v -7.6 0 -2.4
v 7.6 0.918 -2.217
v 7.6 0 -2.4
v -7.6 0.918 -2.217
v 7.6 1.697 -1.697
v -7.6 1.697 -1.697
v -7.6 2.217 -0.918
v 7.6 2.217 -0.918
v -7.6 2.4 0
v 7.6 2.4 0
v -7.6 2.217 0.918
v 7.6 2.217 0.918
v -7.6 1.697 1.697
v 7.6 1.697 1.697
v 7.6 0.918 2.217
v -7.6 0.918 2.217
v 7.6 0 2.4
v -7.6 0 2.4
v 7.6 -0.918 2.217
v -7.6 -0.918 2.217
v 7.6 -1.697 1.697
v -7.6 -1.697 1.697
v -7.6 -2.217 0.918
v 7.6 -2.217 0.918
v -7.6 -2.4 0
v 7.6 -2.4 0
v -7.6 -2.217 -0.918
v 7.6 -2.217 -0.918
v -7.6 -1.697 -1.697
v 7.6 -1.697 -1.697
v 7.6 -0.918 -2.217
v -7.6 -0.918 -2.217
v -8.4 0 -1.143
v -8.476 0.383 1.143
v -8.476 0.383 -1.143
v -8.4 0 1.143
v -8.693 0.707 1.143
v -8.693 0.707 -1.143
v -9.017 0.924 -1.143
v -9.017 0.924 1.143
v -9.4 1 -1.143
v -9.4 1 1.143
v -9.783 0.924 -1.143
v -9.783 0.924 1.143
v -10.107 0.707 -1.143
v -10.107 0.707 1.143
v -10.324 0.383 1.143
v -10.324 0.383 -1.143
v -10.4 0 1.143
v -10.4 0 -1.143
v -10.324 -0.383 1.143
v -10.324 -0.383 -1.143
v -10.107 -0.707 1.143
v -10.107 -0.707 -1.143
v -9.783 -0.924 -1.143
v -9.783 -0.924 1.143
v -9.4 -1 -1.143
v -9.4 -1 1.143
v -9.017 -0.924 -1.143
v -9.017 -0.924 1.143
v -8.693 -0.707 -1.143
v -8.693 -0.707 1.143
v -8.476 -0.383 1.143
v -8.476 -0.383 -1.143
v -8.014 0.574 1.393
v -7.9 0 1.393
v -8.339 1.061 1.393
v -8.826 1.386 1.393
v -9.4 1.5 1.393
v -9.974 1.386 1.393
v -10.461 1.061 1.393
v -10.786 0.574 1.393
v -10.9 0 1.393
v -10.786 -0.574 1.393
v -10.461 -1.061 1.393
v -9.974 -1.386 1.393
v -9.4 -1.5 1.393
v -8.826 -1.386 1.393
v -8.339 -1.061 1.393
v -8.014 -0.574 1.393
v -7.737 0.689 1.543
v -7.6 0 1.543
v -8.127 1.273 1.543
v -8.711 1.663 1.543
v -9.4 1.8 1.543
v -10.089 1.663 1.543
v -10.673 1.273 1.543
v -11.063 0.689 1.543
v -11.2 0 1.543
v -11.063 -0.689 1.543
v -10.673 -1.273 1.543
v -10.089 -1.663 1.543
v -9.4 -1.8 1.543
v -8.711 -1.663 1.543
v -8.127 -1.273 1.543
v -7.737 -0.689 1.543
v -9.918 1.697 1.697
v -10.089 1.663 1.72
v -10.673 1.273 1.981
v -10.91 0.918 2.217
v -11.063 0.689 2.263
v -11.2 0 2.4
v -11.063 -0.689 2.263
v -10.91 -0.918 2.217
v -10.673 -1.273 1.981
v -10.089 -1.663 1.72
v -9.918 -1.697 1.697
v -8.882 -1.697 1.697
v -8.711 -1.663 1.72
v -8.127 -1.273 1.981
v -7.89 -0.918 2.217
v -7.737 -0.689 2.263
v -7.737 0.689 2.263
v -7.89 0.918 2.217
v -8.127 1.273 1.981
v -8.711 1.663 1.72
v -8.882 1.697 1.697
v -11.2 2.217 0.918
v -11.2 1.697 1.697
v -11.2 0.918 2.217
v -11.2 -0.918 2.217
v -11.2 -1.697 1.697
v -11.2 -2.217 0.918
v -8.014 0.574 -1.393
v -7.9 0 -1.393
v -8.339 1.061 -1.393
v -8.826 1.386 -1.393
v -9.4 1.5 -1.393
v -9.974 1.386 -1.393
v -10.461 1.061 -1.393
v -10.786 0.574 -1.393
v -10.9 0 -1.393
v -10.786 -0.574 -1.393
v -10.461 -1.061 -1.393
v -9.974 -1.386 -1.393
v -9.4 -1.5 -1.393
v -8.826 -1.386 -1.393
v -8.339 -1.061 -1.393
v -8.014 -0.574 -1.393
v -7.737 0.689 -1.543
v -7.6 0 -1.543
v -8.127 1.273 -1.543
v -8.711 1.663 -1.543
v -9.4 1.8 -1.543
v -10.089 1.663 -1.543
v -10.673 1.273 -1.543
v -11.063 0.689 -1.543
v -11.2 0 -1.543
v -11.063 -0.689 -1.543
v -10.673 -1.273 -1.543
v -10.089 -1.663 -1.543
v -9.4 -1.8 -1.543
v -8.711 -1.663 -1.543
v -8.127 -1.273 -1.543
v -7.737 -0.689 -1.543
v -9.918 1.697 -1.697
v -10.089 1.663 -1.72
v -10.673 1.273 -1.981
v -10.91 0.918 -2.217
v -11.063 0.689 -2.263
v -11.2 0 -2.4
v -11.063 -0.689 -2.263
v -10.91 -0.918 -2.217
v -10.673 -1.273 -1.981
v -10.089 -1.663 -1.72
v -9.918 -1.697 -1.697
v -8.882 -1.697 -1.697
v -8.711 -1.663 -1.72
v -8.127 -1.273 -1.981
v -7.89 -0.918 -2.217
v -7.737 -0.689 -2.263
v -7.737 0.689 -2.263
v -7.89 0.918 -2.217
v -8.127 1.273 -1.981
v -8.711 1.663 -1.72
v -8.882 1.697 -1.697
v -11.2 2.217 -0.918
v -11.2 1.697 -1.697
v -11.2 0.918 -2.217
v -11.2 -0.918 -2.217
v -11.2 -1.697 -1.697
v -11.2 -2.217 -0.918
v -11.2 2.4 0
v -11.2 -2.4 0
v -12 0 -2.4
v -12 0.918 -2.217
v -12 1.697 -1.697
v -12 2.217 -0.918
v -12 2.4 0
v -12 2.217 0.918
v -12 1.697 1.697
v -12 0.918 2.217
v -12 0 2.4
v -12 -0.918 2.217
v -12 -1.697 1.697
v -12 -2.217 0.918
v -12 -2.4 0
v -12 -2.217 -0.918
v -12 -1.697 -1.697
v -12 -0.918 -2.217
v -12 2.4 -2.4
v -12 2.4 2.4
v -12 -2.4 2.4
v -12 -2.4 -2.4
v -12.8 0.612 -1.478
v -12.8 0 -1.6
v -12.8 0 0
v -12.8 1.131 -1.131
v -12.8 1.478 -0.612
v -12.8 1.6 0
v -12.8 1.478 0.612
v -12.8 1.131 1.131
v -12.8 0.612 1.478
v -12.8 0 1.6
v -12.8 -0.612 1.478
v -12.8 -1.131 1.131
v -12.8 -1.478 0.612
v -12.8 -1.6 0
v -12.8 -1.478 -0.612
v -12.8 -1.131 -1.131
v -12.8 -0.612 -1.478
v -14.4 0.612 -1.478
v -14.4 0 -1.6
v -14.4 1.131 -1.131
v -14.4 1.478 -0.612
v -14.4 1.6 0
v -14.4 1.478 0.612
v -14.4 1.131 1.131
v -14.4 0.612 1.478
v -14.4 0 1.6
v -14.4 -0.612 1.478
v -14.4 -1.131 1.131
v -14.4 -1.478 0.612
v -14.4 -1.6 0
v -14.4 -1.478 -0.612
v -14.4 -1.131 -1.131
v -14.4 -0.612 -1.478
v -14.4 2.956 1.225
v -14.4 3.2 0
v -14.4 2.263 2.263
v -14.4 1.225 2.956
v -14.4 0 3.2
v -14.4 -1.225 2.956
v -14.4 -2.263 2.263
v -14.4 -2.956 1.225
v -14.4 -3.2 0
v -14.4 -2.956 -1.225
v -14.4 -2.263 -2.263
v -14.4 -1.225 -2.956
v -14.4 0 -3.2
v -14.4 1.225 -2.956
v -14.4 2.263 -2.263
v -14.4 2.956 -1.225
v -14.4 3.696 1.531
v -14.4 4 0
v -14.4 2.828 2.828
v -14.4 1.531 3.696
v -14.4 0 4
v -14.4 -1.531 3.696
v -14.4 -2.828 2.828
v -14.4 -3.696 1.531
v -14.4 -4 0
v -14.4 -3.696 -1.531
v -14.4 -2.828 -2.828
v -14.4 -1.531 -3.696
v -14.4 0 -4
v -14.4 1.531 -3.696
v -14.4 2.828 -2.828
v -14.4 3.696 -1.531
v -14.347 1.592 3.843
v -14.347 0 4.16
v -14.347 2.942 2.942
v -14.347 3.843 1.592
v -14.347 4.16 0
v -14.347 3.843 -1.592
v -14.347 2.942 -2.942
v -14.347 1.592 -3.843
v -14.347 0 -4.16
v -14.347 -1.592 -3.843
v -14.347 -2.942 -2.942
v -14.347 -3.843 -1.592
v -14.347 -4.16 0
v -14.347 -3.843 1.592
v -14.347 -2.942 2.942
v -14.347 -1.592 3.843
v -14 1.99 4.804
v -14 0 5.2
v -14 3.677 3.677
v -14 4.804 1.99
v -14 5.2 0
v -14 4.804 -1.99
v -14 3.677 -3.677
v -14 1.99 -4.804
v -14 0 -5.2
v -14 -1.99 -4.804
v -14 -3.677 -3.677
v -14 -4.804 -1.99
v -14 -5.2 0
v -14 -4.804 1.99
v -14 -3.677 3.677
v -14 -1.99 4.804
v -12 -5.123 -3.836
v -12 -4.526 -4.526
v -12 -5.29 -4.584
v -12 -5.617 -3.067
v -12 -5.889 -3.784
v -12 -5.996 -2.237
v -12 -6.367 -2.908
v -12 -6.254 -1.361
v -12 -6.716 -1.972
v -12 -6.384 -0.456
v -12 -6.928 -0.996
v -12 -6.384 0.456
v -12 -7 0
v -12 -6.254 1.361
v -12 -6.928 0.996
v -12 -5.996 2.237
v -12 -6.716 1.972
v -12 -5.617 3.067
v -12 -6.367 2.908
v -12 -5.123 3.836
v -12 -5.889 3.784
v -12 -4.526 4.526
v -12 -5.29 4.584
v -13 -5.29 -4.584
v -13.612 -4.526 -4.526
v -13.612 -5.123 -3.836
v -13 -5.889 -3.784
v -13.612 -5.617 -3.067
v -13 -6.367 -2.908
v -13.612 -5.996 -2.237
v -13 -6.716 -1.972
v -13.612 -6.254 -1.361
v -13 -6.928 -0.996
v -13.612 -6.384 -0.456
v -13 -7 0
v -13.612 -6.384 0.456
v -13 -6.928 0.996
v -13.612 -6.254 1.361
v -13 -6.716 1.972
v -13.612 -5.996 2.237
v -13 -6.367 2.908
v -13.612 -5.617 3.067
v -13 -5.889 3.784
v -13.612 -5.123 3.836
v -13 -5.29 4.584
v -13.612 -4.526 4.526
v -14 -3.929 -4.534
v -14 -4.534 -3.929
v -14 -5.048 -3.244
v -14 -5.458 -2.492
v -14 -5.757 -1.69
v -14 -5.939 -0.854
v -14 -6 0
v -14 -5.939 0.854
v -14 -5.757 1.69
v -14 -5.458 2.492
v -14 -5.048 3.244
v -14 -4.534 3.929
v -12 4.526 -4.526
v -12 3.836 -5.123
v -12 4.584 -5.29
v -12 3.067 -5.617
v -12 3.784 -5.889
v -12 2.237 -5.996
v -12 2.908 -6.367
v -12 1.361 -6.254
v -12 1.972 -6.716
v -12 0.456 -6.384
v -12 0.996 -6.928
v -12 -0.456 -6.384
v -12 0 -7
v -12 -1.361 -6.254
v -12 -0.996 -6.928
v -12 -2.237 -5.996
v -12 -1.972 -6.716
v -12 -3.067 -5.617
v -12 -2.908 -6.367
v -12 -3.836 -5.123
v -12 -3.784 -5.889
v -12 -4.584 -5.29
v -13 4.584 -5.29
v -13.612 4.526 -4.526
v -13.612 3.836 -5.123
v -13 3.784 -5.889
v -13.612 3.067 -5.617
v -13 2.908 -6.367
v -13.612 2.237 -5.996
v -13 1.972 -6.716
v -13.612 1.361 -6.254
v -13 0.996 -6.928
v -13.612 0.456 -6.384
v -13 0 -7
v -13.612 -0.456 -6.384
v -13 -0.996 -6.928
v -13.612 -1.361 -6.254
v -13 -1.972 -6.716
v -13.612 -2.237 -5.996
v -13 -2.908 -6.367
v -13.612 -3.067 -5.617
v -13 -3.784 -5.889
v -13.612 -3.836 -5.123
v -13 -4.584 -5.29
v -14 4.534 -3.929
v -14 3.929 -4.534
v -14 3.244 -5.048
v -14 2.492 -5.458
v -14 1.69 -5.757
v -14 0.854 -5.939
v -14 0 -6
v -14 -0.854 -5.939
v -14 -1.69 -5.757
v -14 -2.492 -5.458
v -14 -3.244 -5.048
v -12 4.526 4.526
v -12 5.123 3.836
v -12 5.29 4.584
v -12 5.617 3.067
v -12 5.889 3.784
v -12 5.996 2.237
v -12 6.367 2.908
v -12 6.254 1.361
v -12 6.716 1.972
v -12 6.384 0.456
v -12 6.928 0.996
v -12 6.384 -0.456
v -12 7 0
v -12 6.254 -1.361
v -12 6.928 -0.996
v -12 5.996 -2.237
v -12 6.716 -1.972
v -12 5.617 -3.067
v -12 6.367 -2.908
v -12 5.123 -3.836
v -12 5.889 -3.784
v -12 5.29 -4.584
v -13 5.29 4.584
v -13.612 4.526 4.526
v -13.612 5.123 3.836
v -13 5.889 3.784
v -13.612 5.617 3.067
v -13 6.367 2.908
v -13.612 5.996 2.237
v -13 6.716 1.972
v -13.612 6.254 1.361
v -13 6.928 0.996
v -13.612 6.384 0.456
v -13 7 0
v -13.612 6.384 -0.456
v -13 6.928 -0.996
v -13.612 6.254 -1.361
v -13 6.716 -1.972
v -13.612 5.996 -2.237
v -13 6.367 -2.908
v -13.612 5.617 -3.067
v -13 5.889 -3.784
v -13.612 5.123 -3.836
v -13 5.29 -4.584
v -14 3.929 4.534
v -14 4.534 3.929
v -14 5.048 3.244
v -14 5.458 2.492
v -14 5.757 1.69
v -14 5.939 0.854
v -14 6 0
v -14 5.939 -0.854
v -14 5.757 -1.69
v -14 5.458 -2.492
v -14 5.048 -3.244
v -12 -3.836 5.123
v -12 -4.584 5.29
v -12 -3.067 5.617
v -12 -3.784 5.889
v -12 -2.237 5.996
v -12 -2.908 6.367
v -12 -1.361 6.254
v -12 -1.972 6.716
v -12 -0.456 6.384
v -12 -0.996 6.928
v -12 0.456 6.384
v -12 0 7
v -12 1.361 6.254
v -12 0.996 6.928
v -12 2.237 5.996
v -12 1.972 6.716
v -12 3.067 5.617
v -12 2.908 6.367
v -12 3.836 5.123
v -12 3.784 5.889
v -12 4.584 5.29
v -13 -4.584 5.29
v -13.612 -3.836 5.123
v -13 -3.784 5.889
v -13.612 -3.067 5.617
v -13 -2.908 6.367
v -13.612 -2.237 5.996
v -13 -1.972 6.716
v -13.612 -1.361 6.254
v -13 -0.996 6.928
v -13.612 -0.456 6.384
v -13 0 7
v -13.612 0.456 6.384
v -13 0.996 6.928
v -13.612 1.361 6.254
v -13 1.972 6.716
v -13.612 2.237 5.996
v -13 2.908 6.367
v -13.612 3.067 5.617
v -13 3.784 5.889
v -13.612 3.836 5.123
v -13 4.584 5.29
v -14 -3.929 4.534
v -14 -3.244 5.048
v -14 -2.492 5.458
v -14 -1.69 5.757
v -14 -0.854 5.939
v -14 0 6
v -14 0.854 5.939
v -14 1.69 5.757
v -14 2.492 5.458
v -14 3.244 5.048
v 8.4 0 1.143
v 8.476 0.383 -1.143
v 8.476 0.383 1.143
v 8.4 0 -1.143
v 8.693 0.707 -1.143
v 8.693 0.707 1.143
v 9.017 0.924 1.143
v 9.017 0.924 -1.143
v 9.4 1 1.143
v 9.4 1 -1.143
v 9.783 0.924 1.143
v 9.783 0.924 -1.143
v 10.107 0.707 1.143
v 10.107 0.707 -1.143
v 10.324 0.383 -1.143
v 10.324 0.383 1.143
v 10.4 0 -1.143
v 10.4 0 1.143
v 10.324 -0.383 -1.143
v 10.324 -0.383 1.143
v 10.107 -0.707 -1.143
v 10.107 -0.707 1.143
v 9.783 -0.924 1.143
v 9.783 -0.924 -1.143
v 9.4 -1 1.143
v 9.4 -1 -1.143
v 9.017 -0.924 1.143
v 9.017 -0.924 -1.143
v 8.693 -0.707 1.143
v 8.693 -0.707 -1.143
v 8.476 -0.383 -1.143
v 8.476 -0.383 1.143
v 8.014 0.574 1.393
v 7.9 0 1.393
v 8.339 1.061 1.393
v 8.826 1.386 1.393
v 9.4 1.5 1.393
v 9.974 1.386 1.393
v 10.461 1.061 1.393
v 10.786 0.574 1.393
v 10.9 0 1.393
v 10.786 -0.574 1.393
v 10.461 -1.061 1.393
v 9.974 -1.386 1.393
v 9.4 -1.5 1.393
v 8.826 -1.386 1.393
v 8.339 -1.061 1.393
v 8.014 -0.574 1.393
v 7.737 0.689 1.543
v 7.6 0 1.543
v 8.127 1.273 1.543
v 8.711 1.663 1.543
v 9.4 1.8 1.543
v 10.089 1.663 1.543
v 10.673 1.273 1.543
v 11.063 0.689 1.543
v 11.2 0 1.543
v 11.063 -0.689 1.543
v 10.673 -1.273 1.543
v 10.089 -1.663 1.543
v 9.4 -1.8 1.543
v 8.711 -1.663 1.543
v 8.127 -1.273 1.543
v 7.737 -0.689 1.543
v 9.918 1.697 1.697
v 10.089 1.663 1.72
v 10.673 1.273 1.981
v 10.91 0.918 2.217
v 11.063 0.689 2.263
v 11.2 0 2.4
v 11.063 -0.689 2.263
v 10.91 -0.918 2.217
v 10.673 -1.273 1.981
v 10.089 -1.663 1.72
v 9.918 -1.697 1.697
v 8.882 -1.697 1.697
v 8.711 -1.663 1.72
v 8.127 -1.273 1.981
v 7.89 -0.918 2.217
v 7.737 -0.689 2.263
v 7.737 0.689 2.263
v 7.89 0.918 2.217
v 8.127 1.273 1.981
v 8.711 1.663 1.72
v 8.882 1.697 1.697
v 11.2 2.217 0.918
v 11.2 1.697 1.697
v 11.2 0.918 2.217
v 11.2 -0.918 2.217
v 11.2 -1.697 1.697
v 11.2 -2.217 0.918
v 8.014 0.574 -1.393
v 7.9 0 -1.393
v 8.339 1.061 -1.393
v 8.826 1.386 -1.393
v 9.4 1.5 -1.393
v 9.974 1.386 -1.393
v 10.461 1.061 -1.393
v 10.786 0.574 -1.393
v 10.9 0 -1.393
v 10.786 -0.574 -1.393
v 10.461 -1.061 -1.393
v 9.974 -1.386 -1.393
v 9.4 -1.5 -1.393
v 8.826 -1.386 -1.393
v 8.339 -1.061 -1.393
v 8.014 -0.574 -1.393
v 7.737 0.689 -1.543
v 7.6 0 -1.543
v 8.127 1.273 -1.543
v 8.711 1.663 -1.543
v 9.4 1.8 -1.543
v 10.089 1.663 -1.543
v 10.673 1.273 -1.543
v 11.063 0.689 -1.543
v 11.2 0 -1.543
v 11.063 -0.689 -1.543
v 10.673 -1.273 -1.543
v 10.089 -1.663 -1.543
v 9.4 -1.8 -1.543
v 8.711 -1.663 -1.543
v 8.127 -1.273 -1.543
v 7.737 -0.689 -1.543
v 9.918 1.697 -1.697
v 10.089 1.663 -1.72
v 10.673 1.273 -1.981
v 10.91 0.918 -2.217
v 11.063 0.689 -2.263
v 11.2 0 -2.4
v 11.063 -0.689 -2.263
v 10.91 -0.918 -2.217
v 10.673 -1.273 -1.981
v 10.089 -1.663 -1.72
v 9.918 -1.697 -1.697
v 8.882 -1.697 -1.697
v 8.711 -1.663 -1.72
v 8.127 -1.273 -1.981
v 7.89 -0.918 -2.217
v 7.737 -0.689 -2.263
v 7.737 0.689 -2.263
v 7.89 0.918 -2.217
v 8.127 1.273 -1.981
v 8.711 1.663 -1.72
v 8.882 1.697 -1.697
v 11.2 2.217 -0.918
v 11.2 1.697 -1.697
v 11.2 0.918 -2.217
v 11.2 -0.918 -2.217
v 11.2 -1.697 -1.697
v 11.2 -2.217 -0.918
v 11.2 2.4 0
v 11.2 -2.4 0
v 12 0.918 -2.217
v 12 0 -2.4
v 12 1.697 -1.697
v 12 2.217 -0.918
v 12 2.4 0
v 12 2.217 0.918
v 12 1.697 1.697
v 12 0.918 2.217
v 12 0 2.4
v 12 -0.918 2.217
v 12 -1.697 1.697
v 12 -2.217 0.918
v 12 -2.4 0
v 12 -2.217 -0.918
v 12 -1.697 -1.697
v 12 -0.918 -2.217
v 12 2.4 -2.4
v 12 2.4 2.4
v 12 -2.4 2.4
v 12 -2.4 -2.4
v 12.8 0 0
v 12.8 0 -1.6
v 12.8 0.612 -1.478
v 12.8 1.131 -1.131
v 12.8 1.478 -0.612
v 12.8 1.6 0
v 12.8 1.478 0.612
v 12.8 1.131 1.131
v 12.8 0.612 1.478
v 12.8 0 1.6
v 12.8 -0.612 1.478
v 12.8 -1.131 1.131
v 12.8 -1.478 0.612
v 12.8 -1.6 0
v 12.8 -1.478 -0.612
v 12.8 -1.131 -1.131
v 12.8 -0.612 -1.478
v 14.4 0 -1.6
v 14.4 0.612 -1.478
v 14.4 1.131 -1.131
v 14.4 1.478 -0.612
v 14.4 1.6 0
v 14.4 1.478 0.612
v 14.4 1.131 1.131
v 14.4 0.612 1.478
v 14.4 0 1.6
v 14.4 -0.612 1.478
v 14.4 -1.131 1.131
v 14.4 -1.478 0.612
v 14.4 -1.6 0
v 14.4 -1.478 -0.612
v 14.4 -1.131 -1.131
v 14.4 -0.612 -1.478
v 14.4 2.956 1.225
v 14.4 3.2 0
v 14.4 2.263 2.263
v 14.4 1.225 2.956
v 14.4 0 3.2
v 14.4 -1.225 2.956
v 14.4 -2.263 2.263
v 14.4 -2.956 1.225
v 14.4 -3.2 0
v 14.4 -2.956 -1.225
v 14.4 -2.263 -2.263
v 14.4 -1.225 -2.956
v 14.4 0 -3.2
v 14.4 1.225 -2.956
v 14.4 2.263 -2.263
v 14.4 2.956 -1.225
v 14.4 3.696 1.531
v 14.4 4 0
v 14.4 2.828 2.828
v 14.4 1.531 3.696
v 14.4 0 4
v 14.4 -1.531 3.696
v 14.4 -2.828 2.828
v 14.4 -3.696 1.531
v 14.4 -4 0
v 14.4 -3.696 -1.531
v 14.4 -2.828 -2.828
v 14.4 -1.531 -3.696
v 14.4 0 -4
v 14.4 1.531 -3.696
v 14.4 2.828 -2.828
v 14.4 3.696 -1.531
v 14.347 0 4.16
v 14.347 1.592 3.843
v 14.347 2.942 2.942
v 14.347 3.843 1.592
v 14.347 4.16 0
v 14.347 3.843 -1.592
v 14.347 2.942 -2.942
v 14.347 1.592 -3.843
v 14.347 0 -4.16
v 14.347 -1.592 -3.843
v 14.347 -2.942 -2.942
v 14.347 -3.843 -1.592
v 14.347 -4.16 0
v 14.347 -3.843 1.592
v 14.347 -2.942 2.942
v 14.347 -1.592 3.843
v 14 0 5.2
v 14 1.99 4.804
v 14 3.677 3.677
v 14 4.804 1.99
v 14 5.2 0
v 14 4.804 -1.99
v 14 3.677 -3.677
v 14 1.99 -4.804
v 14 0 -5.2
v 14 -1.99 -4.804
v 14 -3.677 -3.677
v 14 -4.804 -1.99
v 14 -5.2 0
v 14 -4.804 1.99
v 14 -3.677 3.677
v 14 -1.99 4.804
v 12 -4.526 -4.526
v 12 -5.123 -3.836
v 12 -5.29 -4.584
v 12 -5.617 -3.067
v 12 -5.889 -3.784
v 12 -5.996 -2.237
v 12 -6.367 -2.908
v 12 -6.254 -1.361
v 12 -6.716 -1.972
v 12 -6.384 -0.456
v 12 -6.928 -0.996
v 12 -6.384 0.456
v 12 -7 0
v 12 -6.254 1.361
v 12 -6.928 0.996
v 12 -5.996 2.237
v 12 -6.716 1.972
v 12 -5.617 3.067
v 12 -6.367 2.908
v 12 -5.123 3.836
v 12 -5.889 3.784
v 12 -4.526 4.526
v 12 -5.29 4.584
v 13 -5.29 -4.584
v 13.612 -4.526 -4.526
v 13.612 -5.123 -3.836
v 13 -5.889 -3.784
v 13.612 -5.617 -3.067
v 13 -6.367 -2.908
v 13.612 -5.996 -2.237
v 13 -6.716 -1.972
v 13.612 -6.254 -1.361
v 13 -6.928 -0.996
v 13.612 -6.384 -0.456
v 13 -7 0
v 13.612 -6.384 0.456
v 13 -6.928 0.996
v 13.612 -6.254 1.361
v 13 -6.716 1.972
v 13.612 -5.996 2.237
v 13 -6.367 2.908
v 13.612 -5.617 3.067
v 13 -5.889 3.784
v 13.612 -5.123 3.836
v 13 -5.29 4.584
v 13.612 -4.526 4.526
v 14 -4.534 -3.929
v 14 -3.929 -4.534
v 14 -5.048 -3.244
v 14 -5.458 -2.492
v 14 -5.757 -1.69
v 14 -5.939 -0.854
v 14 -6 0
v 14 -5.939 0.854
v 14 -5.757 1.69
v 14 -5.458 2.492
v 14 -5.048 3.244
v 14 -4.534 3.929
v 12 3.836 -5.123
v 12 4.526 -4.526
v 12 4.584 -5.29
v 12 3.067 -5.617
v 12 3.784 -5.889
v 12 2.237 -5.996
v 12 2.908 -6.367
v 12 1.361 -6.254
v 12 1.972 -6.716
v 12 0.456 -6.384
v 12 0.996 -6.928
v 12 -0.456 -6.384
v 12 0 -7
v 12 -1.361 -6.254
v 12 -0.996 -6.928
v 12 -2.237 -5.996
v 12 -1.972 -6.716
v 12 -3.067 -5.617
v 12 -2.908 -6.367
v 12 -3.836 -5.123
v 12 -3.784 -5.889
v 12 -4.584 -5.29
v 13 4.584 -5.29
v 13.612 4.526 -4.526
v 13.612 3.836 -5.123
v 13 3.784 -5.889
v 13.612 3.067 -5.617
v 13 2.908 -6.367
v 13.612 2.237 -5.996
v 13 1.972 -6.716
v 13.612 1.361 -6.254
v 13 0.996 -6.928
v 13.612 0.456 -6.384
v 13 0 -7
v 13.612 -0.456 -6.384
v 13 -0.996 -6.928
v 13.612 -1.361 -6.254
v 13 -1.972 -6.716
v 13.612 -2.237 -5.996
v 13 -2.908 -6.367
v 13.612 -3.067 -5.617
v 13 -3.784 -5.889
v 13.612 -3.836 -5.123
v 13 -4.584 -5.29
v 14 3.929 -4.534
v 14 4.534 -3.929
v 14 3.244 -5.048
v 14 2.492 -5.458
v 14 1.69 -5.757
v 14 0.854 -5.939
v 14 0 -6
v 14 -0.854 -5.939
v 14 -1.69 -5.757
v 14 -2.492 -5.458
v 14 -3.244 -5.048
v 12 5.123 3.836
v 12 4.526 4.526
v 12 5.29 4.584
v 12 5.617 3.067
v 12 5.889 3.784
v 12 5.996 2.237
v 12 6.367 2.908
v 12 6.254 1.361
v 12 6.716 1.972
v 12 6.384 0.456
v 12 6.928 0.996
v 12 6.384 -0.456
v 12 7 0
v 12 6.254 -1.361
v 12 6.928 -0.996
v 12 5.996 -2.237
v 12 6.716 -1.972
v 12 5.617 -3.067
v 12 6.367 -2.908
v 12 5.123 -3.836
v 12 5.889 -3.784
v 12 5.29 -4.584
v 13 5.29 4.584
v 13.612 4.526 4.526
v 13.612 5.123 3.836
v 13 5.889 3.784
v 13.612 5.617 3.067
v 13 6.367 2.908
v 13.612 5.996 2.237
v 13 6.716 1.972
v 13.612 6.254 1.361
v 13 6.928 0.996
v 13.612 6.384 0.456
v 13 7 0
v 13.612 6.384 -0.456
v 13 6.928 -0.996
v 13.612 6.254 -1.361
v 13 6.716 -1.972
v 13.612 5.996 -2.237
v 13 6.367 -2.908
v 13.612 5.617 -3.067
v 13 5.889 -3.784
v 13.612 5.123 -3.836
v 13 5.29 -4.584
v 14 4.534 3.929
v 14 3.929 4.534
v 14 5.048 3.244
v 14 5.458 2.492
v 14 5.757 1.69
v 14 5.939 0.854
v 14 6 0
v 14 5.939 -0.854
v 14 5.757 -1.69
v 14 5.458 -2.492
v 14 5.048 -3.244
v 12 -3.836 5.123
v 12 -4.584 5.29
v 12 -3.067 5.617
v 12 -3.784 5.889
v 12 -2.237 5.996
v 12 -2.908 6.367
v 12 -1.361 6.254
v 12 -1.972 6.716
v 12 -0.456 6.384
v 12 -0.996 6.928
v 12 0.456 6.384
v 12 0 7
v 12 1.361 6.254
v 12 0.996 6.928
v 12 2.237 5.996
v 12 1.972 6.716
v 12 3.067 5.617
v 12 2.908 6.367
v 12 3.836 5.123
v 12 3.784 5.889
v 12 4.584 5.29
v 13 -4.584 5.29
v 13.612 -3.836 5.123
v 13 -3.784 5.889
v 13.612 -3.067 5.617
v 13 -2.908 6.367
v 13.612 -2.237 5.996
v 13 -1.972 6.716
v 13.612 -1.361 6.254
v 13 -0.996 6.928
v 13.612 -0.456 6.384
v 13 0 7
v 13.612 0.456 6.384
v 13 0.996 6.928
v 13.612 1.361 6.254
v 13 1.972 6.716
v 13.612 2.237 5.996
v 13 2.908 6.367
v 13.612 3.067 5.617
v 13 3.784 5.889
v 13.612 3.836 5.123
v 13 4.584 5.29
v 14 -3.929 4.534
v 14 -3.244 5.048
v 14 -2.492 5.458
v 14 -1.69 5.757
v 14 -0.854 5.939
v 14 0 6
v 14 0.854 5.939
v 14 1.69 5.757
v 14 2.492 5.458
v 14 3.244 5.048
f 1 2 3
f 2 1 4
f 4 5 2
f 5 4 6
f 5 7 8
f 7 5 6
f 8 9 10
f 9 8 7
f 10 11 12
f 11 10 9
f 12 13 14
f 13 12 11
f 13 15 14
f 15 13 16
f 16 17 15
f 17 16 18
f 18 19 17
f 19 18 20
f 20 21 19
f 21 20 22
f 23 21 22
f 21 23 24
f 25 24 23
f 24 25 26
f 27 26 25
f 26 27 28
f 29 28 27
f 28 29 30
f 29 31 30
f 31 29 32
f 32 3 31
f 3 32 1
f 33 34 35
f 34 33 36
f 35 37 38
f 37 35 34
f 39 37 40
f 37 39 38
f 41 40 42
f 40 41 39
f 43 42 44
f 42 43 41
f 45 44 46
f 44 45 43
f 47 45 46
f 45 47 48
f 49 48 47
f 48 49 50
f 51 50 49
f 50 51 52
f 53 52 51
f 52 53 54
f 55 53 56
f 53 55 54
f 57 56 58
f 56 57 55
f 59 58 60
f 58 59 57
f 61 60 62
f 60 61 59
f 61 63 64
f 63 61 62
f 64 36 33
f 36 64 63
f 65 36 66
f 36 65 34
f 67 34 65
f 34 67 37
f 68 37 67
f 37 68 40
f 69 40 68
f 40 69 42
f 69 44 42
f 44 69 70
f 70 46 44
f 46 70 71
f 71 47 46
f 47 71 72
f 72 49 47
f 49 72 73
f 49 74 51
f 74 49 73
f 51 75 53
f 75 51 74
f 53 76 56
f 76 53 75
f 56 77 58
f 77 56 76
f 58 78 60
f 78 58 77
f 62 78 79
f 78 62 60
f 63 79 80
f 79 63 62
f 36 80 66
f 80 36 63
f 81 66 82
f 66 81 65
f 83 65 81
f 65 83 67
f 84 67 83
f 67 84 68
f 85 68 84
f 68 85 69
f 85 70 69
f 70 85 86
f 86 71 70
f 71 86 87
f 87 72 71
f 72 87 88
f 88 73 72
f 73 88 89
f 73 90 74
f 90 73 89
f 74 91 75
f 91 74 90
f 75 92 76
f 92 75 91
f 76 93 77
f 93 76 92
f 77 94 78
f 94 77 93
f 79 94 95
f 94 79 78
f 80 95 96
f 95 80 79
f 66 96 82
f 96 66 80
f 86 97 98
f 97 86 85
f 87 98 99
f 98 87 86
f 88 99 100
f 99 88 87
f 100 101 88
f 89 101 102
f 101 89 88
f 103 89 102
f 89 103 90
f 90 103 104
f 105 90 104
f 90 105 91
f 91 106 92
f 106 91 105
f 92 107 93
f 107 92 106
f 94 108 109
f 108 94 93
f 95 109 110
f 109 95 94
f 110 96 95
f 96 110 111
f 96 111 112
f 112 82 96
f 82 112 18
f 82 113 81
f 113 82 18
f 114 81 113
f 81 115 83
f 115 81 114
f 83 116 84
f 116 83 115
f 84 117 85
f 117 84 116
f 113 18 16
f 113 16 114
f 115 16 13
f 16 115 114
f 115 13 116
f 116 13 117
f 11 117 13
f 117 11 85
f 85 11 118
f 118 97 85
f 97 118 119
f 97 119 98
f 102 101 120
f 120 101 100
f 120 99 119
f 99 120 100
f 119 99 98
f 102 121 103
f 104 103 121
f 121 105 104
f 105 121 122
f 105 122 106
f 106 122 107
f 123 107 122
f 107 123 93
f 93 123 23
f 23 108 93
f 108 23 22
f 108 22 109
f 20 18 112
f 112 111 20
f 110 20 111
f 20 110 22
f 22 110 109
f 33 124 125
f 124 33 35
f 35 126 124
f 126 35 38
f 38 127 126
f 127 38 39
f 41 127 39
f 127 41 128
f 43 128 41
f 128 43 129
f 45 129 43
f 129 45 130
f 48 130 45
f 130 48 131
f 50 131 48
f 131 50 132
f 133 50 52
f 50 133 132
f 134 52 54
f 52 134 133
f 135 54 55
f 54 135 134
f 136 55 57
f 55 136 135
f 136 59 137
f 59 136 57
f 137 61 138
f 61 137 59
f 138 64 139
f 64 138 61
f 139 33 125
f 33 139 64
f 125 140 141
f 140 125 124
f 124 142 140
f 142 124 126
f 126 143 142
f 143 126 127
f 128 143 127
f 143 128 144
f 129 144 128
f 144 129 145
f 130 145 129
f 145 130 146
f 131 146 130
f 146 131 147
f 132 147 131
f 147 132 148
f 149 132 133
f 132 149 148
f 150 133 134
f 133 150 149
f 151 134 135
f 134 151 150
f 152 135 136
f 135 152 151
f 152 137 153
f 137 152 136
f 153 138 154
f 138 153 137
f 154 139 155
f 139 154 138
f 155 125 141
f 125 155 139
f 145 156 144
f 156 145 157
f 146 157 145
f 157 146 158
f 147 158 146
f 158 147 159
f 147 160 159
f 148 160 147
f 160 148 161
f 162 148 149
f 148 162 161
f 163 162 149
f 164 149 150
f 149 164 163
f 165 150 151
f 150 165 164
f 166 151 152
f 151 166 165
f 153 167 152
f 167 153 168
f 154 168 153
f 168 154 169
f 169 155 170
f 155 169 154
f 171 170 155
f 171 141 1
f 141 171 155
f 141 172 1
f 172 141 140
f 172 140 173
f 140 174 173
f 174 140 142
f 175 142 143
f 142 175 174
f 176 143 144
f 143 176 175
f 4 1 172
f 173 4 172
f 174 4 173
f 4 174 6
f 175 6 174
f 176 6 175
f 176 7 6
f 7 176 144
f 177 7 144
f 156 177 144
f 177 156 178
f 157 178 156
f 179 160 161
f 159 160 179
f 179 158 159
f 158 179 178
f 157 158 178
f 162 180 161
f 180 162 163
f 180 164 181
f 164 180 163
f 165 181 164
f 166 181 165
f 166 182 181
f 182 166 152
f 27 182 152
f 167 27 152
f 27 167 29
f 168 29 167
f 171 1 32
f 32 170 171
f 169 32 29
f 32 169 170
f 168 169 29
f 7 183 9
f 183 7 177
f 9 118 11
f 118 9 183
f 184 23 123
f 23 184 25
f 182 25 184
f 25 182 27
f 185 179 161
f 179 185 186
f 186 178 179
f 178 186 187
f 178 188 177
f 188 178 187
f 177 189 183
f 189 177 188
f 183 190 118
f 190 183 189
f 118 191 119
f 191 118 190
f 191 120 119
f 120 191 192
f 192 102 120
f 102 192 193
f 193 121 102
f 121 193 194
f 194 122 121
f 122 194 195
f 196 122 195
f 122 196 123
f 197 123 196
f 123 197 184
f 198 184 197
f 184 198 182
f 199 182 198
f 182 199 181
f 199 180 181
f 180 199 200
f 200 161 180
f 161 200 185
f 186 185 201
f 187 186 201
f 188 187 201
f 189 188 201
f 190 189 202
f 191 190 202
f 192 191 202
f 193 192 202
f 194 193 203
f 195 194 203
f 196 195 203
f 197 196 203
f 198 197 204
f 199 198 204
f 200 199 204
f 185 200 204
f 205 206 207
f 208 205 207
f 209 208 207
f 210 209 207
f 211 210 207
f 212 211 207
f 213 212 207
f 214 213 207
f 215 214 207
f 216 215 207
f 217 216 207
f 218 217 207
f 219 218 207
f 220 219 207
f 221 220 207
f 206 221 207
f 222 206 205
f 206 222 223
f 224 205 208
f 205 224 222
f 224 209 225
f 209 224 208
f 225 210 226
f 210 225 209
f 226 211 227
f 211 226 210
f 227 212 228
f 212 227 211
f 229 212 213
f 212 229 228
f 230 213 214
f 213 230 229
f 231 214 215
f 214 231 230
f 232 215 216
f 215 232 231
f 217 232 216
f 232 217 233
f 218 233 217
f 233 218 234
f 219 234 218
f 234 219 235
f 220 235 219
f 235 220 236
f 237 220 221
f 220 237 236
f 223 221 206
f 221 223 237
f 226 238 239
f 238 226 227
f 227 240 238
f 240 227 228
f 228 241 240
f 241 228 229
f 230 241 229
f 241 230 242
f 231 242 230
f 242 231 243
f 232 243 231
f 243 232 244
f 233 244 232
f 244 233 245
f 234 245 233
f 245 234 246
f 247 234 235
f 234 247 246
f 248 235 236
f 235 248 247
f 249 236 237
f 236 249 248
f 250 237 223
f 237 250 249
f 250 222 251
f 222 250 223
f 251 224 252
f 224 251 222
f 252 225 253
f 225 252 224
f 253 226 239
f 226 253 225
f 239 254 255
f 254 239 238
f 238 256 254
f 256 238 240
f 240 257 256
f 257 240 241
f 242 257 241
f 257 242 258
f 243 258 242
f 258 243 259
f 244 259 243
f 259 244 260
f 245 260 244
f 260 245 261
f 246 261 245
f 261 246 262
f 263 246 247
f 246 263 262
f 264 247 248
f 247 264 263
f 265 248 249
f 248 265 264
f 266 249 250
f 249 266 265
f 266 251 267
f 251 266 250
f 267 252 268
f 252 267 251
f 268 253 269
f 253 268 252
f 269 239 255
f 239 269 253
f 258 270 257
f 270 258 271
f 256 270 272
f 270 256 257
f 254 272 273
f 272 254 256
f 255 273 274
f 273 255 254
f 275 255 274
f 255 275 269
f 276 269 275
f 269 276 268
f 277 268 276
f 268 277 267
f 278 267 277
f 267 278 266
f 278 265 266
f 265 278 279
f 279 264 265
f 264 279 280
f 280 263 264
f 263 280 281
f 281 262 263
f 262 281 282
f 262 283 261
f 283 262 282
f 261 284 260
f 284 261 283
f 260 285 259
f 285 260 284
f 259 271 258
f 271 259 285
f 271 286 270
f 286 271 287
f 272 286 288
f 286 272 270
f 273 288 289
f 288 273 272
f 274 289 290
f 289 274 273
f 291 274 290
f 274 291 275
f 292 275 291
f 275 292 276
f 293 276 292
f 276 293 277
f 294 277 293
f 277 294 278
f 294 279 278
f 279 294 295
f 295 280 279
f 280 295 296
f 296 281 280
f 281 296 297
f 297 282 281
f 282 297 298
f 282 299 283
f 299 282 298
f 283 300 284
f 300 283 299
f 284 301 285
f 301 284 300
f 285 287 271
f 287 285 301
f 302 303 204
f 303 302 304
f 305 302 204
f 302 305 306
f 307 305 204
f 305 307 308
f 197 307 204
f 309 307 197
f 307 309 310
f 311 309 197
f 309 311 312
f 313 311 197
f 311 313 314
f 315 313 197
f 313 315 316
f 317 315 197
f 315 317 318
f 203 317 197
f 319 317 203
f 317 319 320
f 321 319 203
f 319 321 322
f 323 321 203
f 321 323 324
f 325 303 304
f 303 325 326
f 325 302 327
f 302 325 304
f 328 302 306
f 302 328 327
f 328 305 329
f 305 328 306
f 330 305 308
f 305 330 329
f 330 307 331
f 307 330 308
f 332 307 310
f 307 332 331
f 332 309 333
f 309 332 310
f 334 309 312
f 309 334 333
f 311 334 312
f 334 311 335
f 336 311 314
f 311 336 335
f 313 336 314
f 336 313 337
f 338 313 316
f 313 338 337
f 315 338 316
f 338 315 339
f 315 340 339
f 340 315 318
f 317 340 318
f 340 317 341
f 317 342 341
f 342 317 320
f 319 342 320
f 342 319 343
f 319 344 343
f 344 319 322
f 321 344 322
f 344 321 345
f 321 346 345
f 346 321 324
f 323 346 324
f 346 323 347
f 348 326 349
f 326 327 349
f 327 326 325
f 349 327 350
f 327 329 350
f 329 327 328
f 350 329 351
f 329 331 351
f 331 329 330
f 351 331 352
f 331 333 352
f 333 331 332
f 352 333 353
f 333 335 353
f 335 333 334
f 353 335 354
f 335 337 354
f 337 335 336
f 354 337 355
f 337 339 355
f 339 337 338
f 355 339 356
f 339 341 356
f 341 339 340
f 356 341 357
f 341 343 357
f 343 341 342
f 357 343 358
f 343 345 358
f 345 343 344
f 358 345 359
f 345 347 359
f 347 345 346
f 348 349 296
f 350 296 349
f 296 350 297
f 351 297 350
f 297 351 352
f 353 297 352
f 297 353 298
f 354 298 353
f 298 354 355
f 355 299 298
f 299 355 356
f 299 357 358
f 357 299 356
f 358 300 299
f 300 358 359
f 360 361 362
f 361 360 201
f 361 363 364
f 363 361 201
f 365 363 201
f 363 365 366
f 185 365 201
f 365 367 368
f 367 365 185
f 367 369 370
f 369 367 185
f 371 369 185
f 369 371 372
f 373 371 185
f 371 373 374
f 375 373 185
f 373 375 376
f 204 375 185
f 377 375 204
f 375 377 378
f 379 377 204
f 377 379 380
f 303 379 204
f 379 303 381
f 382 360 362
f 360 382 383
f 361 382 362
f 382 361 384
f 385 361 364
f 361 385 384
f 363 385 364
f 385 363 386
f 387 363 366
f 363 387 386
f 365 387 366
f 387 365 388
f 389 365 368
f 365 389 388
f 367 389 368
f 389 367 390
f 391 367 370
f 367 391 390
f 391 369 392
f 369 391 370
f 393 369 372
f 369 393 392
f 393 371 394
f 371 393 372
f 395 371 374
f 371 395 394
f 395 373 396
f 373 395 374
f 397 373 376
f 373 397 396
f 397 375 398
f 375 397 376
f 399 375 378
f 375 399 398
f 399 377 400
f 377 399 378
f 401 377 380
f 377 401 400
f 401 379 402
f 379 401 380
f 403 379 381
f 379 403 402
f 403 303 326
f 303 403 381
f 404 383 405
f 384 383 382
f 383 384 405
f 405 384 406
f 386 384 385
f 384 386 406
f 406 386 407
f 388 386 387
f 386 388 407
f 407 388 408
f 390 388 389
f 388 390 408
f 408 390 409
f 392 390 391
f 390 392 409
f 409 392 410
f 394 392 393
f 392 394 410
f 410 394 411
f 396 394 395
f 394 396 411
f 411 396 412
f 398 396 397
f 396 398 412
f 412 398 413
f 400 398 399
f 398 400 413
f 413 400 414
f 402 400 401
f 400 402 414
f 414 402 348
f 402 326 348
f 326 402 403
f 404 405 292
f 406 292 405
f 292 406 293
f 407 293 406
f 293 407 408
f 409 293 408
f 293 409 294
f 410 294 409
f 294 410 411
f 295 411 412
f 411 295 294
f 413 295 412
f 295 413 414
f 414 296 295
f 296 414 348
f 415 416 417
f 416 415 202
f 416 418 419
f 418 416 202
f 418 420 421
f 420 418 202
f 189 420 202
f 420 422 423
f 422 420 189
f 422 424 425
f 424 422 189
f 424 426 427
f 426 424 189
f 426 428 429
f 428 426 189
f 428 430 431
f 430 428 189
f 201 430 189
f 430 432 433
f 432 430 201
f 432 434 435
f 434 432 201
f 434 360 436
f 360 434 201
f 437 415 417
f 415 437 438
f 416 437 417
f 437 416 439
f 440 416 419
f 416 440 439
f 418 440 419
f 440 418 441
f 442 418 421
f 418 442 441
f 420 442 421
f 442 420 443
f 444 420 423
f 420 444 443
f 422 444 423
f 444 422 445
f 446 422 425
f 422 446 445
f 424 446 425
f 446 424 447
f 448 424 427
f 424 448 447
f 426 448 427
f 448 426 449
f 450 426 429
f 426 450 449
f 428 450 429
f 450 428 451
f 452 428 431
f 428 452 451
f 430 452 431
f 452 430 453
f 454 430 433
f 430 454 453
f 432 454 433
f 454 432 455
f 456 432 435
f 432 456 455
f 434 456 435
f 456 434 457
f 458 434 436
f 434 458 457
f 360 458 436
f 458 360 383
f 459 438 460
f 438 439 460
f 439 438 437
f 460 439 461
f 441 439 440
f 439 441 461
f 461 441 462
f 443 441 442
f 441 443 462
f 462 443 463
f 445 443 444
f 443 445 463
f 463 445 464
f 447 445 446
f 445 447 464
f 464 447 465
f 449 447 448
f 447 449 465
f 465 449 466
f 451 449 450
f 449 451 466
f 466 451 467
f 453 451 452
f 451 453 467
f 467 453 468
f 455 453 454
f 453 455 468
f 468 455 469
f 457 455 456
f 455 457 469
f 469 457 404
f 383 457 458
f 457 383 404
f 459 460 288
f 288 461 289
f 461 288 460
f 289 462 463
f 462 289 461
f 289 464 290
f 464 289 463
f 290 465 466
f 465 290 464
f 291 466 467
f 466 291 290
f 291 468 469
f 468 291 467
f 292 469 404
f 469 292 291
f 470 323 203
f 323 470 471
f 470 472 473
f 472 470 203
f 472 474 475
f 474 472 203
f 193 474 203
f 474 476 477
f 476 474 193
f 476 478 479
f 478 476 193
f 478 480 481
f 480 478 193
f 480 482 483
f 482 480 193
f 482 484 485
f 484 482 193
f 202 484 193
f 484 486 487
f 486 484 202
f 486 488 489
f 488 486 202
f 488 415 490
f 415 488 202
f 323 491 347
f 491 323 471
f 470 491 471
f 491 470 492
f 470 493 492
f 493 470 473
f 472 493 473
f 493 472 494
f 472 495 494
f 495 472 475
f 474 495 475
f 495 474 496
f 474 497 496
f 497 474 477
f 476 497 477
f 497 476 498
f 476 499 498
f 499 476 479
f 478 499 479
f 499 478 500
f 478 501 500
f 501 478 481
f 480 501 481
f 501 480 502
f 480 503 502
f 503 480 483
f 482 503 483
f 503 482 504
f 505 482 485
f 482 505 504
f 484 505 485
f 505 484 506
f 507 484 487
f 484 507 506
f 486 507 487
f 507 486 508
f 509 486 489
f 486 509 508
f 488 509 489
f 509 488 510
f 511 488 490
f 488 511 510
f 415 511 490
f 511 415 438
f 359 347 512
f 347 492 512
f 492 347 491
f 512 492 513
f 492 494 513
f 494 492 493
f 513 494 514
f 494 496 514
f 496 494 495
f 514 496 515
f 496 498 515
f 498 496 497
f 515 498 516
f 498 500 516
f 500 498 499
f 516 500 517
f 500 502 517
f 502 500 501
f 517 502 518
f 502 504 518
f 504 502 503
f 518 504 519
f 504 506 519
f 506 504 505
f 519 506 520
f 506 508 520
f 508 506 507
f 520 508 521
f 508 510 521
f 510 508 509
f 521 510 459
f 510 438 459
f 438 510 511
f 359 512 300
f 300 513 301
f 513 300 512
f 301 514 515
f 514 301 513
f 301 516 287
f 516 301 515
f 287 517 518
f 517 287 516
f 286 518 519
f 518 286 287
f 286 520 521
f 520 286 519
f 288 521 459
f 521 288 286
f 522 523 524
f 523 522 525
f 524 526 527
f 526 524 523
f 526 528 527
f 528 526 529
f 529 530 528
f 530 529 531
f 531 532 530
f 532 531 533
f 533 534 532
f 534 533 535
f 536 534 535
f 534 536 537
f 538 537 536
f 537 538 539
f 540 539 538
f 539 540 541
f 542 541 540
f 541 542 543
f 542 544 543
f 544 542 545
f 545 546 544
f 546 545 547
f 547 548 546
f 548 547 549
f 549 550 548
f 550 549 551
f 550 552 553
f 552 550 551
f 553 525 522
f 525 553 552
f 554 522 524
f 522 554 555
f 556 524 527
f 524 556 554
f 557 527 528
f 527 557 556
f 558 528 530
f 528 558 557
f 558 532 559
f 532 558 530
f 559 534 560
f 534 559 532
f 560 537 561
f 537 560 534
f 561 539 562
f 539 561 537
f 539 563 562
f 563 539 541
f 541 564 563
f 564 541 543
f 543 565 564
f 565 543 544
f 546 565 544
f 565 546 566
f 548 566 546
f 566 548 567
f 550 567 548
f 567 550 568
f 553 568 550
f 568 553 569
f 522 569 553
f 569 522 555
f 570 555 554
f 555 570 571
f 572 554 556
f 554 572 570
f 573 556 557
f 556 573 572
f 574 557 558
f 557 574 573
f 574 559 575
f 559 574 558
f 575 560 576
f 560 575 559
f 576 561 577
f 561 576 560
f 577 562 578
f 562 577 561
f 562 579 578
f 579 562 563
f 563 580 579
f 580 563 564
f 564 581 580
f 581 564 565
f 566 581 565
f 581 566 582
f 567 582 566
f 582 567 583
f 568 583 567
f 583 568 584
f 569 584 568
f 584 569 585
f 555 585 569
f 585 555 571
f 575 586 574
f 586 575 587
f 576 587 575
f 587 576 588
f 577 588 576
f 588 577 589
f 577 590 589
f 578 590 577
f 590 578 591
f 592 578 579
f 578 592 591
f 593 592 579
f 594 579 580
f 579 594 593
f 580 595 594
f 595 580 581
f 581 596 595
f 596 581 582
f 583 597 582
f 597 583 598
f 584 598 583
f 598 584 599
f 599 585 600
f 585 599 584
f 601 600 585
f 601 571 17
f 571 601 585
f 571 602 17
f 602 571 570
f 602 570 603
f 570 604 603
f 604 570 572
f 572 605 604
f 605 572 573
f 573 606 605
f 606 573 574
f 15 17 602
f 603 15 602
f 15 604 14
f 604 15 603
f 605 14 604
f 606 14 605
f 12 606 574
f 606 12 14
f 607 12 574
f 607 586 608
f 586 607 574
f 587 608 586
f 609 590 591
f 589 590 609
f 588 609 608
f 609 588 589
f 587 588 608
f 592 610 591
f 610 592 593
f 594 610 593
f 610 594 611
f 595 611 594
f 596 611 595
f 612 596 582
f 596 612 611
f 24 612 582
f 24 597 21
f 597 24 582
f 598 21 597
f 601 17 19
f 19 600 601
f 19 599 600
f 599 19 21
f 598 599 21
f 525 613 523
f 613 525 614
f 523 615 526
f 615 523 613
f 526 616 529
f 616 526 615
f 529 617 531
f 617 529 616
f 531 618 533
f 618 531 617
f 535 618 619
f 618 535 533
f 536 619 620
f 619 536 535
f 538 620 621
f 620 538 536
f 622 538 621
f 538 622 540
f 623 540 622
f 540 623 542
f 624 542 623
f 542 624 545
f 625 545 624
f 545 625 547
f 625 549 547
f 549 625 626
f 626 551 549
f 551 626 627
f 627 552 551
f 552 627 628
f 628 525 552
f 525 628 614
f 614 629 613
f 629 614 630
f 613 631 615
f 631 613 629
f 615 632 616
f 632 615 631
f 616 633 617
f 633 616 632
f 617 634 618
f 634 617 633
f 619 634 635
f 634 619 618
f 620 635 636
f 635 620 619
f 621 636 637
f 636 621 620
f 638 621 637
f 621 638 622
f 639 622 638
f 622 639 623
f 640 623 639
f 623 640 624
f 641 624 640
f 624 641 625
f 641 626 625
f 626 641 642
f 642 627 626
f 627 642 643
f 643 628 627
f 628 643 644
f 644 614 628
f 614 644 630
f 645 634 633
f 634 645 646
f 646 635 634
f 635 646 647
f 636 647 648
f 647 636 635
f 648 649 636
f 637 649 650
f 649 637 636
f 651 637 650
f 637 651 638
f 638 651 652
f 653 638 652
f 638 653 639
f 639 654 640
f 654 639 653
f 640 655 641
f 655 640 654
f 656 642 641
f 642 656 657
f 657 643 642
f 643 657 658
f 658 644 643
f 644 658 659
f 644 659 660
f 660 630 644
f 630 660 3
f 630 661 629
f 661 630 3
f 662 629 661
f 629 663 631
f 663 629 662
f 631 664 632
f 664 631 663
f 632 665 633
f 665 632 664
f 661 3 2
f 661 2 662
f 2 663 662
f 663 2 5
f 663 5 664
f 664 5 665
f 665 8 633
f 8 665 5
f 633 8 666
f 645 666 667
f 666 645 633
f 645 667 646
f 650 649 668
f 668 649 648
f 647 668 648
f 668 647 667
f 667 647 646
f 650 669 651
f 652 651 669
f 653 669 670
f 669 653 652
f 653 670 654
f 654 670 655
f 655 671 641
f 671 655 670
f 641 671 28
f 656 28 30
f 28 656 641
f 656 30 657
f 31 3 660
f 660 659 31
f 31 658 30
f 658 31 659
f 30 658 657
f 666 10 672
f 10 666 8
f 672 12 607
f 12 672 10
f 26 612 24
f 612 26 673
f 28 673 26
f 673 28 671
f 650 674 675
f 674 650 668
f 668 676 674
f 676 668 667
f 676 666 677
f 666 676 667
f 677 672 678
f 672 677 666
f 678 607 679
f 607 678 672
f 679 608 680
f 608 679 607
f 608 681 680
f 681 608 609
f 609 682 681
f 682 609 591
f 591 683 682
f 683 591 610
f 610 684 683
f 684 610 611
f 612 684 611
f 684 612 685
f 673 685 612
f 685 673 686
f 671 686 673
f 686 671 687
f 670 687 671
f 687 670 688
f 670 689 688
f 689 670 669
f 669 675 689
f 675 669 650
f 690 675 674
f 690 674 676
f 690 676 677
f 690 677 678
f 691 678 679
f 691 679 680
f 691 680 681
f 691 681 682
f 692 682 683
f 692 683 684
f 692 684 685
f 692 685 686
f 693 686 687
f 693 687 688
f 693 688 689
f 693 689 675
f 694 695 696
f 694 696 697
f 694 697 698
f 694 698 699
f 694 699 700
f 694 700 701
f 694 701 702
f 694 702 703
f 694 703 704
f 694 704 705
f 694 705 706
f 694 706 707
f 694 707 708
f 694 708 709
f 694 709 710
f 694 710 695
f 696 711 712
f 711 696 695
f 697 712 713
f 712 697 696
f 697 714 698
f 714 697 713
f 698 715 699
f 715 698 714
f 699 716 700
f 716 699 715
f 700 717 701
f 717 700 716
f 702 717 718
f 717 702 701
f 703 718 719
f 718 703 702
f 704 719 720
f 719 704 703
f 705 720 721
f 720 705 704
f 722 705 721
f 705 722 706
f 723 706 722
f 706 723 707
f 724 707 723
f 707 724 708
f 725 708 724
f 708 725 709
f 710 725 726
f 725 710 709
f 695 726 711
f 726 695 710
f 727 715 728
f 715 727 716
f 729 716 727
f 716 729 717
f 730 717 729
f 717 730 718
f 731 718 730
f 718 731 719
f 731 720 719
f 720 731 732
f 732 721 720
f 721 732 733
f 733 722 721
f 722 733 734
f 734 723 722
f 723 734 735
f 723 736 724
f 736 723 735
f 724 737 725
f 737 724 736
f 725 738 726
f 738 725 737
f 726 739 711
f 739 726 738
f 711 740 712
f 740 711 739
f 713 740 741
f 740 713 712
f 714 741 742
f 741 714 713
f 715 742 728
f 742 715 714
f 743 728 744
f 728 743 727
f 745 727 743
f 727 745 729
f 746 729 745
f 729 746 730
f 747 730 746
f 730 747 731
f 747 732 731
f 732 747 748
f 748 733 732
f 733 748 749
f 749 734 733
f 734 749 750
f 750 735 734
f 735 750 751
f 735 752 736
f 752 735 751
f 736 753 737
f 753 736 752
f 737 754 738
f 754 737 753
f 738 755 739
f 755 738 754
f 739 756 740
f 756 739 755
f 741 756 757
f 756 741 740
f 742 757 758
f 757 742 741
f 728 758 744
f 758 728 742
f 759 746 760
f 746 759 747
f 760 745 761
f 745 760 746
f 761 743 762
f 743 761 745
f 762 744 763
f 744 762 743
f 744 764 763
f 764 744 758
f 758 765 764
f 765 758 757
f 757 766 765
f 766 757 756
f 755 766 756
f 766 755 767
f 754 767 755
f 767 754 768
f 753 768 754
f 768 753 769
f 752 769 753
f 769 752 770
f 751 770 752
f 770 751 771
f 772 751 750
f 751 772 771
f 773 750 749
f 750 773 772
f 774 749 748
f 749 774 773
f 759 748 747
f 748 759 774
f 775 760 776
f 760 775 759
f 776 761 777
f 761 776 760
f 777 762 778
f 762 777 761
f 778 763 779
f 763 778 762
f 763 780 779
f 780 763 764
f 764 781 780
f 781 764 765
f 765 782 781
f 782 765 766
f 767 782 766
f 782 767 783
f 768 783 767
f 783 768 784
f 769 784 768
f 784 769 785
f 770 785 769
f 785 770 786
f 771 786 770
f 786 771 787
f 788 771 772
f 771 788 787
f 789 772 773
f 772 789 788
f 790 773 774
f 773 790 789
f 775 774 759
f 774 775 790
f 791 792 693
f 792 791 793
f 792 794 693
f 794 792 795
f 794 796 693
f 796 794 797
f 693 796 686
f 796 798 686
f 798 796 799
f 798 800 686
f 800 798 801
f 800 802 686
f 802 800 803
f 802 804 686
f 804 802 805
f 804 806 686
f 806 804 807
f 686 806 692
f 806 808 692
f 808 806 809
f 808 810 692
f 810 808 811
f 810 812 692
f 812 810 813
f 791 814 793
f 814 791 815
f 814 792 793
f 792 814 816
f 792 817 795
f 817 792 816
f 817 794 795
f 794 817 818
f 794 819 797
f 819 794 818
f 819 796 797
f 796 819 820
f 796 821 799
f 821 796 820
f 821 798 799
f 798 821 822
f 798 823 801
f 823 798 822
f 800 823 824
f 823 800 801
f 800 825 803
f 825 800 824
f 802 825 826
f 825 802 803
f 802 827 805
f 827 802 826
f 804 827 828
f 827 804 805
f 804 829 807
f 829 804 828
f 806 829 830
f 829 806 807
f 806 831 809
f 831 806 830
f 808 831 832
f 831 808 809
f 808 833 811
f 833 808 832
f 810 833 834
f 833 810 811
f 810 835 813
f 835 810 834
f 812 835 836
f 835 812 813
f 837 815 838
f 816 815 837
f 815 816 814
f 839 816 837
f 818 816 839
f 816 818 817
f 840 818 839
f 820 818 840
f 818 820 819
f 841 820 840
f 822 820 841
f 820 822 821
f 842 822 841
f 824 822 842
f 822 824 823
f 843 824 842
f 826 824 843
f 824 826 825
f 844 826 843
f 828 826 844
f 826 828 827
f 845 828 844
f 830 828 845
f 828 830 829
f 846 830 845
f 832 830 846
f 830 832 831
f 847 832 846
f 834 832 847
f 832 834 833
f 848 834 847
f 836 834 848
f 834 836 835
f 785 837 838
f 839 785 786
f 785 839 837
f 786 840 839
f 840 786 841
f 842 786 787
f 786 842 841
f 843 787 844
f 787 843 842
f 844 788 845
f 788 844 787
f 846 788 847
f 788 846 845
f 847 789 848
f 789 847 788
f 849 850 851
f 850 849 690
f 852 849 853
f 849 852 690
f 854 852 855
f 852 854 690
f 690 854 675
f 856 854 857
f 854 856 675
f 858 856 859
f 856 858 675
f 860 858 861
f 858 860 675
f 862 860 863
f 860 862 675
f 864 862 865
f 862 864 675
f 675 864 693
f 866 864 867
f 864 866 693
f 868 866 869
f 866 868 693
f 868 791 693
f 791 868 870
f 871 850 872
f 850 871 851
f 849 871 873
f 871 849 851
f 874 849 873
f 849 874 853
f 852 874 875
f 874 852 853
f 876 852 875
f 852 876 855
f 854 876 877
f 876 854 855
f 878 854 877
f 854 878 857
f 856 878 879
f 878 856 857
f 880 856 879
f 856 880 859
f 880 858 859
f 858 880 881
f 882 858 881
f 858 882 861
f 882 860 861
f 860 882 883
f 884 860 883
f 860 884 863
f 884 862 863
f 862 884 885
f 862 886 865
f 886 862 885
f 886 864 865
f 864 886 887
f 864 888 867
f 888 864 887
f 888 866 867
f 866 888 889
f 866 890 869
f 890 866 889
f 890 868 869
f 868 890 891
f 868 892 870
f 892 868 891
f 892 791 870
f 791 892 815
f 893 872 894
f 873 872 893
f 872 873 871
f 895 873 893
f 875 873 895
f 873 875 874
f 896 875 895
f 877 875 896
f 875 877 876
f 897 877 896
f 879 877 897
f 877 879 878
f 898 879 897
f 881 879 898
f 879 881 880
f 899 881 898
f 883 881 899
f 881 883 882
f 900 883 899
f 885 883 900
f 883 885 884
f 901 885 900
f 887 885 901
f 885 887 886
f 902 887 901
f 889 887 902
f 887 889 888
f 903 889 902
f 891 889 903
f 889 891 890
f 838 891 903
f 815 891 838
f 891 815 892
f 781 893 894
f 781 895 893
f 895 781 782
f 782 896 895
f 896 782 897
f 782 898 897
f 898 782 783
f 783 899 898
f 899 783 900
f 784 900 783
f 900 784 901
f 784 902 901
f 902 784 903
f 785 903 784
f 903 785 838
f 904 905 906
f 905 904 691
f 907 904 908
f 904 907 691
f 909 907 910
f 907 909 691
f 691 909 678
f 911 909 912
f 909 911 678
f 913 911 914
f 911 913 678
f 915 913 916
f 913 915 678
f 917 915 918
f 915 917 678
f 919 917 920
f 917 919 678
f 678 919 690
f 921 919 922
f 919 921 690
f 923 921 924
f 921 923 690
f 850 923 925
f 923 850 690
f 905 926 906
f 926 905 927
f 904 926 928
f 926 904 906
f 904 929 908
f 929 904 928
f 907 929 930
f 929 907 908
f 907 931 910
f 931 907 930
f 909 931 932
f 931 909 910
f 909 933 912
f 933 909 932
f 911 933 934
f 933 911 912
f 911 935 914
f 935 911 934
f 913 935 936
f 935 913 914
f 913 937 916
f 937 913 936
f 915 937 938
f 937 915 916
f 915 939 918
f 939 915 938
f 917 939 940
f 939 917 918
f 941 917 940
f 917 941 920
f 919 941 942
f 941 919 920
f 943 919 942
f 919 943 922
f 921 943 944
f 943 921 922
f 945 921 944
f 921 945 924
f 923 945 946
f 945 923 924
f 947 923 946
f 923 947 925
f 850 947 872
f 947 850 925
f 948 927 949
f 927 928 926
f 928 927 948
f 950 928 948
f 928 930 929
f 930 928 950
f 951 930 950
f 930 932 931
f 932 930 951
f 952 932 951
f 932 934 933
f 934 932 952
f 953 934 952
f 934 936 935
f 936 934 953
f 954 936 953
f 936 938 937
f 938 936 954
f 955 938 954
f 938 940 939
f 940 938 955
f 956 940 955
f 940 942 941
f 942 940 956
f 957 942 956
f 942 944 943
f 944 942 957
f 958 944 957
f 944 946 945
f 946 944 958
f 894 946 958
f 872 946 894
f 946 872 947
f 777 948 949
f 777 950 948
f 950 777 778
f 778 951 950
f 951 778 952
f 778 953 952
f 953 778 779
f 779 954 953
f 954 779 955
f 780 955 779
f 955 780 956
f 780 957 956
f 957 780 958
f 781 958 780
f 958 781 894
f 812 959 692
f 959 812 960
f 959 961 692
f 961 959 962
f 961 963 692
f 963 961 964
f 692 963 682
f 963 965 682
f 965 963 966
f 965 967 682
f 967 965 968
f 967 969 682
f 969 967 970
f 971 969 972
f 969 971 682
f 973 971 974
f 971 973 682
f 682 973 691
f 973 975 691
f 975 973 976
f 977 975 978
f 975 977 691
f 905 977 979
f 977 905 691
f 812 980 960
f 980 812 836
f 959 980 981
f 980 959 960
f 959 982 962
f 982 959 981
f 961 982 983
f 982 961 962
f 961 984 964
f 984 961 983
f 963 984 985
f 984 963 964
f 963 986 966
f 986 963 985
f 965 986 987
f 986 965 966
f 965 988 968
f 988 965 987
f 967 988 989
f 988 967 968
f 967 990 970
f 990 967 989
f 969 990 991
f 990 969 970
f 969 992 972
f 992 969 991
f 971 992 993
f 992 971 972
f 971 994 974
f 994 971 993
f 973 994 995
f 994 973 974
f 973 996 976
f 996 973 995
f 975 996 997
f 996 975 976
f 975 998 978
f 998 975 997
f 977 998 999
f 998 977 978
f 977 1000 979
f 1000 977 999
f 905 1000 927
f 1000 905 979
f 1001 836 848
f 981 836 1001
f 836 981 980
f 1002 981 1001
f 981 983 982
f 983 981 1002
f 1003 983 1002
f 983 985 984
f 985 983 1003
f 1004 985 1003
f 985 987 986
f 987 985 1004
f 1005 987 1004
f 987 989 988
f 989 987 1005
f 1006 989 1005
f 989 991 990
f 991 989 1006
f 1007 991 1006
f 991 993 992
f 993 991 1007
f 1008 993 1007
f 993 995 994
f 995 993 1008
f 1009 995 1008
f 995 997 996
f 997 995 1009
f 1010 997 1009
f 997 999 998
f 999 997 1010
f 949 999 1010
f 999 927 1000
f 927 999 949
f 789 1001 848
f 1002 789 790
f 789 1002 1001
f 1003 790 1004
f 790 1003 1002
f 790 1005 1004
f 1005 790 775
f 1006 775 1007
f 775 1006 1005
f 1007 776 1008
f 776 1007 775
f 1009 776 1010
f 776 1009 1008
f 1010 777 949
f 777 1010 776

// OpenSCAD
use <../lib.scad>
use <../p/4-4cyli.scad>
use <s/4208s01.scad>
function ldraw_lib__4208() = [
// 0 Hose Reel  2 x  4 x  2 Drum
// 0 Name: 4208.dat
// 0 Author: James Jessiman
// 0 !LDRAW_ORG Part UPDATE 2020-03
// 0 !LICENSE Licensed under CC BY 2.0 and CC BY 4.0 : see CAreadme.txt
// 
// 0 BFC CERTIFY CCW
  [0,"BFC","CERTIFY"],
  [0,"BFC","CCW"],
// 
// 0 !HISTORY 2007-07-04 [PTadmin] Header formatted for Contributor Agreement
// 0 !HISTORY 2008-07-01 [PTadmin] Official Update 2008-01
// 0 !HISTORY 2008-07-07 [PTadmin] Moved from 4208 (2007-10-21)
// 0 !HISTORY 2009-07-04 [Eldar] BFC'ed, removed gaps, used primitives
// 0 !HISTORY 2010-04-05 [PTadmin] Official Update 2010-01
// 0 !HISTORY 2020-07-31 [Plastikean] Subparted, used primitives, added teeth, holes, bevels
// 0 !HISTORY 2020-12-29 [PTadmin] Official Update 2020-03
// 
// 
// 1 16 19 0 0 0 -38 0 6 0 0 0 0 6 4-4cyli.dat
  [1,16,19,0,0,0,-38,0,6,0,0,0,0,6, ldraw_lib__4_4cyli()],
// 1 16 0 0 0 1 0 0 0 1 0 0 0 1 s\4208s01.dat
  [1,16,0,0,0,1,0,0,0,1,0,0,0,1, ldraw_lib__s__4208s01()],
// 1 16 0 0 0 -1 0 0 0 1 0 0 0 1 s\4208s01.dat
  [1,16,0,0,0,-1,0,0,0,1,0,0,0,1, ldraw_lib__s__4208s01()],
];
makepoly(ldraw_lib__4208(), line=0.2);
